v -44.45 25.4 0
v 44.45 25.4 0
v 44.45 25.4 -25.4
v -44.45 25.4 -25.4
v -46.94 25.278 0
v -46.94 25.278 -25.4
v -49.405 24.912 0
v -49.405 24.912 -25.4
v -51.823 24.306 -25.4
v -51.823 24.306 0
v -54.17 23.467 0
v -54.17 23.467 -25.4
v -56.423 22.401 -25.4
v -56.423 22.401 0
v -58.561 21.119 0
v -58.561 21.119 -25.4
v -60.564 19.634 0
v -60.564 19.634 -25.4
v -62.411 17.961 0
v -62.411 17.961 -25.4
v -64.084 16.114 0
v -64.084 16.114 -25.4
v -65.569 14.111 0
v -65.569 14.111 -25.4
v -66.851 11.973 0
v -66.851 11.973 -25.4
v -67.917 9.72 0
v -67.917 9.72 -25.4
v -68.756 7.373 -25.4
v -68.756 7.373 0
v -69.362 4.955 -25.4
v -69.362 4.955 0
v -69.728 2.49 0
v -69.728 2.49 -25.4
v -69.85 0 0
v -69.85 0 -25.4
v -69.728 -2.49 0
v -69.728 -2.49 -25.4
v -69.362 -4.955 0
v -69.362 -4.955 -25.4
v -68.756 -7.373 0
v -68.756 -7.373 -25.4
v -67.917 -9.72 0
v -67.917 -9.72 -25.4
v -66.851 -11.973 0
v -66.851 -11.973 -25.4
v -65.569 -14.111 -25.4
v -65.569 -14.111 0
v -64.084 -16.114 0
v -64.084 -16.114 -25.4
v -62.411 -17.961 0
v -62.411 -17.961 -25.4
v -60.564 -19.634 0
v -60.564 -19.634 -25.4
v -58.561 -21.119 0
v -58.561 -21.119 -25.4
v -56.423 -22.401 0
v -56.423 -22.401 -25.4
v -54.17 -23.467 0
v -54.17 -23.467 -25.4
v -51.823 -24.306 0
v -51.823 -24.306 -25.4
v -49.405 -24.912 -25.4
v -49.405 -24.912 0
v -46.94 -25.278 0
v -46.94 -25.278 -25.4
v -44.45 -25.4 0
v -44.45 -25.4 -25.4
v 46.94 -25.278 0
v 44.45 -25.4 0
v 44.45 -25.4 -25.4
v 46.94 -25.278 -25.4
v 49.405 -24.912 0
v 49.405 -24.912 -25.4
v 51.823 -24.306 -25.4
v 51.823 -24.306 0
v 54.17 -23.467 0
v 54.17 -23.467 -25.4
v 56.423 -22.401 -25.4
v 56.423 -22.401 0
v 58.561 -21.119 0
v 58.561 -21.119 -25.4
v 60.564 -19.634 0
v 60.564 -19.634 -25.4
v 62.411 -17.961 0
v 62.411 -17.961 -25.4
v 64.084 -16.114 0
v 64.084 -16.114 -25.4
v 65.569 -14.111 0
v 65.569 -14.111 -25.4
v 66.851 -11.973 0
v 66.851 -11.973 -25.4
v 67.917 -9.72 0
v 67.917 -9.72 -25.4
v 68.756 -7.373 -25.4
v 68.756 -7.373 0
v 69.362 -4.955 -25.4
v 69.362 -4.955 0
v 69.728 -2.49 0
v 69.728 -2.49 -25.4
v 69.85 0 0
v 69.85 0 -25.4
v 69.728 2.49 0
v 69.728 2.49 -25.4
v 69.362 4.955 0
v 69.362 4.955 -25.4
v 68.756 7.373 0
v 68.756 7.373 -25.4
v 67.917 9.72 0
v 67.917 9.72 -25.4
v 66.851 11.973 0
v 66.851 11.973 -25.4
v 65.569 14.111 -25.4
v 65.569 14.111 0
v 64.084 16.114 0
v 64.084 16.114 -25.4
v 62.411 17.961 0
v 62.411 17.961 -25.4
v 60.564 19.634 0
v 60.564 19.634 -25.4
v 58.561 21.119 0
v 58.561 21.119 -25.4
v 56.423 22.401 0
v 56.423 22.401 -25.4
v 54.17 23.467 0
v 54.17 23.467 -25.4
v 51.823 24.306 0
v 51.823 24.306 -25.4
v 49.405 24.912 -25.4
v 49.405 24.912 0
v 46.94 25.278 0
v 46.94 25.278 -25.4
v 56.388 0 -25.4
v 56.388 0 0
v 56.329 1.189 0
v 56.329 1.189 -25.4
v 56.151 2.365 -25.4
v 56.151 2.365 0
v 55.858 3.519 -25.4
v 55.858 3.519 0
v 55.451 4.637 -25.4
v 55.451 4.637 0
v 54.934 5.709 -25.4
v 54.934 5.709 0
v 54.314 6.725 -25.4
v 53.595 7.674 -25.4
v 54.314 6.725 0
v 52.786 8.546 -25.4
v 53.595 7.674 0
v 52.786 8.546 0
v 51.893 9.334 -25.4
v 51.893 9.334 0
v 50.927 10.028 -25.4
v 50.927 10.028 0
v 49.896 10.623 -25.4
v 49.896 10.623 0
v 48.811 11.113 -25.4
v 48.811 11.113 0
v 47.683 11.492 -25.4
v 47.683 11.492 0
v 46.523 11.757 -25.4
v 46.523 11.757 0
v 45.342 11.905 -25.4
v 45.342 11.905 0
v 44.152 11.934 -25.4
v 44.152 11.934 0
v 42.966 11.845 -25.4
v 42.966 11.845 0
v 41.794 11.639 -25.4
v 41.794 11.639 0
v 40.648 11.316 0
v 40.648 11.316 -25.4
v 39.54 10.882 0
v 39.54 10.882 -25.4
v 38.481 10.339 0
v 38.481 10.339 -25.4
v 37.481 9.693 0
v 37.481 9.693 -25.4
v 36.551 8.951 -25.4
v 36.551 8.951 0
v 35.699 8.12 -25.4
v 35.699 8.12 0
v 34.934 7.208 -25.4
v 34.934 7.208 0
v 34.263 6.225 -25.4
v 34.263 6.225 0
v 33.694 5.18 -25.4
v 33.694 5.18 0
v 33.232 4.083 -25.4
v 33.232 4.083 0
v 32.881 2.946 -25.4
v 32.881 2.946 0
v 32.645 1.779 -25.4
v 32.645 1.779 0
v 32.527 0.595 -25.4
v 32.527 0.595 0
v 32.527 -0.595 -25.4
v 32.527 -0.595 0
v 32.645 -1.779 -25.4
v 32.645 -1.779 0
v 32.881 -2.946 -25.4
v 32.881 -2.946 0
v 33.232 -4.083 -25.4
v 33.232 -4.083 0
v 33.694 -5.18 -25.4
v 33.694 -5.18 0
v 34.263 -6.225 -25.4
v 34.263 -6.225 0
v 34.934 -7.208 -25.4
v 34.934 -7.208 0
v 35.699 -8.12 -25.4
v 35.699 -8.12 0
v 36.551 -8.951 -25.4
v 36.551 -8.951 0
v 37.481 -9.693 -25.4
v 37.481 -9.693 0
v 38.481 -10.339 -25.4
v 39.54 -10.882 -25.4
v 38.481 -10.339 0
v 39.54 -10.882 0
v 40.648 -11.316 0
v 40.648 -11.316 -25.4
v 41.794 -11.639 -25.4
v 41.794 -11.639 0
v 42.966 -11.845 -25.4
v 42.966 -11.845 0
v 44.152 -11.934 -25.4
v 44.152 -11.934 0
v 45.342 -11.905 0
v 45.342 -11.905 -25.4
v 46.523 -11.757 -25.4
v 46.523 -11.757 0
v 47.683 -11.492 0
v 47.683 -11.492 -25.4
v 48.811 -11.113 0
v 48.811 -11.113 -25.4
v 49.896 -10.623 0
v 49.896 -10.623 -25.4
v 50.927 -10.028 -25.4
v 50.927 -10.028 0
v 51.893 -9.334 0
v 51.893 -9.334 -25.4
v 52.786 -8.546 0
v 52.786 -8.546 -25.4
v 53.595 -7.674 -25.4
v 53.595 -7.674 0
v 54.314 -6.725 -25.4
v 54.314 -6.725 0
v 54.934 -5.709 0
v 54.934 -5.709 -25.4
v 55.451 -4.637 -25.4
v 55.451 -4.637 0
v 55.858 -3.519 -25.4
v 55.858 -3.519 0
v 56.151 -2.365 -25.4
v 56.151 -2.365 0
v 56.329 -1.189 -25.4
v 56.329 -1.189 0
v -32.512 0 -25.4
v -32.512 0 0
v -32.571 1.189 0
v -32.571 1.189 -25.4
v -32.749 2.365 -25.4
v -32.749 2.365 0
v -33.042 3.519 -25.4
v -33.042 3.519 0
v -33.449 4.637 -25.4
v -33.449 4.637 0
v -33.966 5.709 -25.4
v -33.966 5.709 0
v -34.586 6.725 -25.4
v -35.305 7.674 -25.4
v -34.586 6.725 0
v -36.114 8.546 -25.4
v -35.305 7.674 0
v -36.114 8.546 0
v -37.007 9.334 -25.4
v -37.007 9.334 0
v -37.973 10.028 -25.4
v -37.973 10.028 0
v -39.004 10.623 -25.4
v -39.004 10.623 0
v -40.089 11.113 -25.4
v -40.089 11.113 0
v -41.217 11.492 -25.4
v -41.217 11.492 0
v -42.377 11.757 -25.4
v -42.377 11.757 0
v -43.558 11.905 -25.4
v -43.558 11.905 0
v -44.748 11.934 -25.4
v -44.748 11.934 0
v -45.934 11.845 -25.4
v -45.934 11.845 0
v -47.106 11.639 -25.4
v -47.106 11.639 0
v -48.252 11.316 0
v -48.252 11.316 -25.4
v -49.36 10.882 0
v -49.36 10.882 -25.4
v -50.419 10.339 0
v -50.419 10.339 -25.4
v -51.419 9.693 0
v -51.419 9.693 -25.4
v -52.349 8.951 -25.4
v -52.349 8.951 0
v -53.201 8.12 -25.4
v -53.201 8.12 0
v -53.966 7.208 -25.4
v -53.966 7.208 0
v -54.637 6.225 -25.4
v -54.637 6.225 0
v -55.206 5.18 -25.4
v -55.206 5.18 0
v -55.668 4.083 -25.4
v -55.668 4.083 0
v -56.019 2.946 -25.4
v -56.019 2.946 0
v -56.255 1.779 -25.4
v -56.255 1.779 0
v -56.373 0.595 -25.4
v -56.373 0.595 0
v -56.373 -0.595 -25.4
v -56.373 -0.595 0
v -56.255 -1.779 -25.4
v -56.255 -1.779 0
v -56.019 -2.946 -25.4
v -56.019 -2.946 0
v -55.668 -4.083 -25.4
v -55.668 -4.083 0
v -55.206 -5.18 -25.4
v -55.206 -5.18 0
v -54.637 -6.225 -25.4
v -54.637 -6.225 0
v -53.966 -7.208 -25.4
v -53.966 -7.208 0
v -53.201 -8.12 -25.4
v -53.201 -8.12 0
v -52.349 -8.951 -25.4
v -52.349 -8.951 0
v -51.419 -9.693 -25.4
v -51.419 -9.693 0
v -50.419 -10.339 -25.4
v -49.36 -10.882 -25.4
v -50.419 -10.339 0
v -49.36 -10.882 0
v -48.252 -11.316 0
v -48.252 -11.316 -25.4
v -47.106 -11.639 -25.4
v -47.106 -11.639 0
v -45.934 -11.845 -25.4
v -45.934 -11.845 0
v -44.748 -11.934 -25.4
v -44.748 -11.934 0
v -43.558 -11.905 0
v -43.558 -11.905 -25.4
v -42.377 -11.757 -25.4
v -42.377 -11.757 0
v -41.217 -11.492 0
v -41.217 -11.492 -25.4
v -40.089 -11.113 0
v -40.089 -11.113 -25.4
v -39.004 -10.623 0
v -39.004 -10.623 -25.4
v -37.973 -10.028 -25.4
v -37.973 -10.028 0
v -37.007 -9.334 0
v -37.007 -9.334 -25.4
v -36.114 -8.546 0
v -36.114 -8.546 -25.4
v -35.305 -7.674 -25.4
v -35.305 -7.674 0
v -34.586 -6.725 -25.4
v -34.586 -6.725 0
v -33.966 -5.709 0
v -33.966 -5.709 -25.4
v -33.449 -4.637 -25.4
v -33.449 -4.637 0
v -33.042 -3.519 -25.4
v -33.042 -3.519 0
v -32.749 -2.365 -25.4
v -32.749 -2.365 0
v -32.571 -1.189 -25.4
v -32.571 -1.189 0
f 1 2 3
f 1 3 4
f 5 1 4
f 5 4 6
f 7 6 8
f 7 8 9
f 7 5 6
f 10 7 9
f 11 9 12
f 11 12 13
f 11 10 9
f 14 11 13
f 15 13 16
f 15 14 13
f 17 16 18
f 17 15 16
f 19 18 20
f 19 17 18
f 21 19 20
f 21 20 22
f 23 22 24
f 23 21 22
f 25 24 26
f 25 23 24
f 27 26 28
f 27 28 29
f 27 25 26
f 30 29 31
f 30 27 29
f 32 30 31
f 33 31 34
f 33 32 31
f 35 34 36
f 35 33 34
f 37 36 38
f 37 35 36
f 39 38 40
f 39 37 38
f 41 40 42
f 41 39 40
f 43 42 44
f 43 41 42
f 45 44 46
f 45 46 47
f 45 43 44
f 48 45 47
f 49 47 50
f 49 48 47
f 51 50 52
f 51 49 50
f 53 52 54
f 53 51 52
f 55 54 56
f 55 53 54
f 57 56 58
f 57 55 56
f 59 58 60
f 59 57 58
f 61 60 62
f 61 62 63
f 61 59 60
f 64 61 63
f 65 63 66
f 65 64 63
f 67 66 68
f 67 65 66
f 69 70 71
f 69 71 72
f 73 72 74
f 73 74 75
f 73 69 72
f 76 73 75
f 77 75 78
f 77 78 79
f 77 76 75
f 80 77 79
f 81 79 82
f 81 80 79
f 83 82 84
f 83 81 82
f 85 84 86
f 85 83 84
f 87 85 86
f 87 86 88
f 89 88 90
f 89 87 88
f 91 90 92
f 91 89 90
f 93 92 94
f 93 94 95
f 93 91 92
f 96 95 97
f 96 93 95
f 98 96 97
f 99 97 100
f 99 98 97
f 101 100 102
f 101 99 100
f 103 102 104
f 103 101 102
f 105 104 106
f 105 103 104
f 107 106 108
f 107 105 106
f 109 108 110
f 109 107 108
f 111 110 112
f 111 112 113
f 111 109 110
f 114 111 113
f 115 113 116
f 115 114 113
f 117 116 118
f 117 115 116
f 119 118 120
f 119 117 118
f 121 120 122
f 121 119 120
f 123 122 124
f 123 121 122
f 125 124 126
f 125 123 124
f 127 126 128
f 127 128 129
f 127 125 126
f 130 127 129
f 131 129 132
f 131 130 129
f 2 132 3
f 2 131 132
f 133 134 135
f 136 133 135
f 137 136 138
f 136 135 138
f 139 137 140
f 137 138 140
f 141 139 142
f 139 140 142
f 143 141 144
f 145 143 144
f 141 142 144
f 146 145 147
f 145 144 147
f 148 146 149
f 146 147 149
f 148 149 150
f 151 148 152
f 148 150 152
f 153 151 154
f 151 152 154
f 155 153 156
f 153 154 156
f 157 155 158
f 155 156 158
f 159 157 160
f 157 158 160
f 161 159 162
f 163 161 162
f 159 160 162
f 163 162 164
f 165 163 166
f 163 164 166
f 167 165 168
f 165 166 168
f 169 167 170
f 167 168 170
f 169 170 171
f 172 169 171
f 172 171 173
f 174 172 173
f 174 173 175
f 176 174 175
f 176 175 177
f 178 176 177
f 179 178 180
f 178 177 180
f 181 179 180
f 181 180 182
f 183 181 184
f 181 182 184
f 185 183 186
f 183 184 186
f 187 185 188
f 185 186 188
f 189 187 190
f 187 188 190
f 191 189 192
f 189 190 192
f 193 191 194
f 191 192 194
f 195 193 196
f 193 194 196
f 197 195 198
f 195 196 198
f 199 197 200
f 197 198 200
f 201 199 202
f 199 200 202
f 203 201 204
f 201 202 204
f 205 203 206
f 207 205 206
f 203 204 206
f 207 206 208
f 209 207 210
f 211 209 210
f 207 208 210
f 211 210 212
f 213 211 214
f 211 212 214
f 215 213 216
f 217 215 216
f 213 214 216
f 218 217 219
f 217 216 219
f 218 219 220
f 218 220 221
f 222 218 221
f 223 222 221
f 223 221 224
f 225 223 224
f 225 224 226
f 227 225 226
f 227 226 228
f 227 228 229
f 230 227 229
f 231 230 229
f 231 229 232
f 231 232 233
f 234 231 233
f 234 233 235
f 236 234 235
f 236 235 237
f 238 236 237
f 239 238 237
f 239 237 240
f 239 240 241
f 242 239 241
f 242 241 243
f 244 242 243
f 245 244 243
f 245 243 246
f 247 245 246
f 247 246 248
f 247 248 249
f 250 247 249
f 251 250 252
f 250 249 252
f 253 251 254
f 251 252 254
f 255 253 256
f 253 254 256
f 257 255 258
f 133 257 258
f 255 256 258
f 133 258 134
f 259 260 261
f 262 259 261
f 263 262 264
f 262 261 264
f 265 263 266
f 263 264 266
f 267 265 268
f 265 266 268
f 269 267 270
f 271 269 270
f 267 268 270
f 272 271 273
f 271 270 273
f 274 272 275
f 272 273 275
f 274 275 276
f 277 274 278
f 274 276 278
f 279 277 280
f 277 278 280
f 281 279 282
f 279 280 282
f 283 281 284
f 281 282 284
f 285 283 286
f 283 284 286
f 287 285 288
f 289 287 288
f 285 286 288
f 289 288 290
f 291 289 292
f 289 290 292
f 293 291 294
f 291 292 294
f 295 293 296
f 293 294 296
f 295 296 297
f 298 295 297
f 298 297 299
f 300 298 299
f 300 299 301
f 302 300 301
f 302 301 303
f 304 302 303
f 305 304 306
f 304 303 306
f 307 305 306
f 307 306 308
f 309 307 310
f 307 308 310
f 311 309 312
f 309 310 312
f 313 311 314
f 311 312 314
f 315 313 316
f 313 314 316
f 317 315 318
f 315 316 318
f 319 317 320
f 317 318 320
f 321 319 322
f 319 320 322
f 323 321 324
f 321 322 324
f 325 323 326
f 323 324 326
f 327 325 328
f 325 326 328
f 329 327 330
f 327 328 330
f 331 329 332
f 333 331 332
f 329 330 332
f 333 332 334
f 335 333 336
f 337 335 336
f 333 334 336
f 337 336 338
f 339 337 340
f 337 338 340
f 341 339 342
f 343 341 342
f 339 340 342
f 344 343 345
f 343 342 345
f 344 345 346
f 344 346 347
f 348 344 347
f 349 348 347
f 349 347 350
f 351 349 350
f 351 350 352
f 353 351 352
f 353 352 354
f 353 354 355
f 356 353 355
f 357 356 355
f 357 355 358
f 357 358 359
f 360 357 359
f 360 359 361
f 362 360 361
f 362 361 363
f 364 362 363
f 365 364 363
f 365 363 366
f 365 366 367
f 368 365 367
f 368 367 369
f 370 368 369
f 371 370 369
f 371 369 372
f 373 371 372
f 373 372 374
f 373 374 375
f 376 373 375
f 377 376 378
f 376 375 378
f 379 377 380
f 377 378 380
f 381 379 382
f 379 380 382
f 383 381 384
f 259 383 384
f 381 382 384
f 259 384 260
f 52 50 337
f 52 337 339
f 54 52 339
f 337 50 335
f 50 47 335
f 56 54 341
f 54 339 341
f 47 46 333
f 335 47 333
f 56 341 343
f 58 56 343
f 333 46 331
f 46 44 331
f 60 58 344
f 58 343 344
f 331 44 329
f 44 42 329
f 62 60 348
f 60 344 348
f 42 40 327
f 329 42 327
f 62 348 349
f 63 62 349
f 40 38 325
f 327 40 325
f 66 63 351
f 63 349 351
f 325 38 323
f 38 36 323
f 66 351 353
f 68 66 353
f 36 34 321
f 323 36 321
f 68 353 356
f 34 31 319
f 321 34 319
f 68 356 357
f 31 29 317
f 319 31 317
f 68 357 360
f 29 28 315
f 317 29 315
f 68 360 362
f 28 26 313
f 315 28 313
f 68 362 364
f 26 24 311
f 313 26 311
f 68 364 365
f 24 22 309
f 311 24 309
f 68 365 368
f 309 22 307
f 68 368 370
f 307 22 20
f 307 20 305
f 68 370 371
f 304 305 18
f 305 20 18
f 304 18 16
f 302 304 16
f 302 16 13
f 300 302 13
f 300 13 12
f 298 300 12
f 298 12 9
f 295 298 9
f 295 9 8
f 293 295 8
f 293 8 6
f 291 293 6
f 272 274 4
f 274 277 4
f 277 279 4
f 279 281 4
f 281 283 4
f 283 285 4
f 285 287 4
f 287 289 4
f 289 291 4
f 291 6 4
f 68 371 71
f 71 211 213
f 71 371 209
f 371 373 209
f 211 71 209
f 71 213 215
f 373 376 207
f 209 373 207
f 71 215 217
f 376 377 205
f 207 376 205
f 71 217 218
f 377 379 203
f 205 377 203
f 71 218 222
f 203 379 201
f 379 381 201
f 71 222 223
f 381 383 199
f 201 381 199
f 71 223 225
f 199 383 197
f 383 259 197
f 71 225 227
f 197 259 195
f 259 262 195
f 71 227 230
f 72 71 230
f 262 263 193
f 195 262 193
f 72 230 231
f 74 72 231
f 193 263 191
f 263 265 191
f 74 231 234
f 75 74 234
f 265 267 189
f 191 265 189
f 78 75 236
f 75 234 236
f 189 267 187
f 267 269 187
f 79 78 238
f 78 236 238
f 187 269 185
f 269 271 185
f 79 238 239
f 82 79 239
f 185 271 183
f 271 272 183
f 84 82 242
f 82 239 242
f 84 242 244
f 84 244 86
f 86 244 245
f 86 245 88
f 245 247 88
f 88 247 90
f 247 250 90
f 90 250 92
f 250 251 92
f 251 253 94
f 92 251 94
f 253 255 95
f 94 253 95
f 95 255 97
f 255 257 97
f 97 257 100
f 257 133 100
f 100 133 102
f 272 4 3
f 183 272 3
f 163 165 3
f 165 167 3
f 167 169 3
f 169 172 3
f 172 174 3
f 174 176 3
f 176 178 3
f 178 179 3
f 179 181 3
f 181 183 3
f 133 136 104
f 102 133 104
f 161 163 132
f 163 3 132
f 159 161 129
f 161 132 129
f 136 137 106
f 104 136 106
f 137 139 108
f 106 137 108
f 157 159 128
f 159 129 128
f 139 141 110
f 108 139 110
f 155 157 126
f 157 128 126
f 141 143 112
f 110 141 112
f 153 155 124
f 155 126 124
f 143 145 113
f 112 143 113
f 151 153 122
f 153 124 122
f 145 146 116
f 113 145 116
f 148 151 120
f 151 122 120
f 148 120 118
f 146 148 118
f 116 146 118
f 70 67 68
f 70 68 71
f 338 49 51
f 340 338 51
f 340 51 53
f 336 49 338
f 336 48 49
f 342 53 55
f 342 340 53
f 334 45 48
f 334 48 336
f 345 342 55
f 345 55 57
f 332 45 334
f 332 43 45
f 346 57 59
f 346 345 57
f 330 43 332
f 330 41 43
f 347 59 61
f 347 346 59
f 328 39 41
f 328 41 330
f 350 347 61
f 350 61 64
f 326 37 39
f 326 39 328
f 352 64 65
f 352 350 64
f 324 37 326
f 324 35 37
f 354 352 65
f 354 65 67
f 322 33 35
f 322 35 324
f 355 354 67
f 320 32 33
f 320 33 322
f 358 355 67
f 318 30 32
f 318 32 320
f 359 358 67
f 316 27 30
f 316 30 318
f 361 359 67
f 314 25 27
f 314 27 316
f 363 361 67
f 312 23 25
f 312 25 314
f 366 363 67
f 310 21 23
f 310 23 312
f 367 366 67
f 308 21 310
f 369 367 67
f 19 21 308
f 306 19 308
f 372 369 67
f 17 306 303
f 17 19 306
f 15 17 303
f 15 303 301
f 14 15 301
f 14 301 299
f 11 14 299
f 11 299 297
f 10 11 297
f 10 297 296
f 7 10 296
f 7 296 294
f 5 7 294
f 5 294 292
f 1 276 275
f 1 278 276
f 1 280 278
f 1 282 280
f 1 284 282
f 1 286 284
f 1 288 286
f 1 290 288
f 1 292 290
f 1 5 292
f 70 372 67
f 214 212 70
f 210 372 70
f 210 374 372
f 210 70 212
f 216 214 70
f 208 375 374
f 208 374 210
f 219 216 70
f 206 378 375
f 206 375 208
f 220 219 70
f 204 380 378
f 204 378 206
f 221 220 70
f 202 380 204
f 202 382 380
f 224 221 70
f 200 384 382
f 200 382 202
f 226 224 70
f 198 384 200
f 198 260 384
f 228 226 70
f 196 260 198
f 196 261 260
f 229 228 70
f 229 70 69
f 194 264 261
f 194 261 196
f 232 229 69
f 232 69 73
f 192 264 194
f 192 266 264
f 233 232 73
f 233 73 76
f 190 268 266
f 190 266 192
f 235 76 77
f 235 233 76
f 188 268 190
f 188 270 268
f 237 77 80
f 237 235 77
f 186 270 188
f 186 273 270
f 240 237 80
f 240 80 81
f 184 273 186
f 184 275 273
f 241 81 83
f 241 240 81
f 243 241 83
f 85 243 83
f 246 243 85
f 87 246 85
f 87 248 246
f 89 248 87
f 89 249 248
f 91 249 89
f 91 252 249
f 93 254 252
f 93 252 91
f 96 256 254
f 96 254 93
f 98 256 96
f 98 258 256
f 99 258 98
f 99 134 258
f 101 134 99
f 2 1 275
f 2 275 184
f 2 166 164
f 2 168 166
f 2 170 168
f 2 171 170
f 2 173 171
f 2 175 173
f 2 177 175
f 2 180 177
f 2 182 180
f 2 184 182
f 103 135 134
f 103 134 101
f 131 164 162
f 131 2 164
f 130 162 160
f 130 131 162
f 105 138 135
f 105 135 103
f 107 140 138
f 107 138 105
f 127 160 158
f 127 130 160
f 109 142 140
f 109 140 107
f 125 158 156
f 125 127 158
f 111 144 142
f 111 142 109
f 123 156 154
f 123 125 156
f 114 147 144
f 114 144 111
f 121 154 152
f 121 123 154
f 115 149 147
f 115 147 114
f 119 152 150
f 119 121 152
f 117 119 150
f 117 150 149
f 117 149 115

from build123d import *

# Parameters (mm, degrees)
F0_R     = 11.938
F1_DEPTH = 25.4


with BuildPart() as f1:
    # F0 (on Top) → F1 (new body)
    with BuildSketch(Plane.XY):
        with BuildLine():
            Line((44.45, 25.4), (-44.45, 25.4))
            ThreePointArc((-44.45, 25.4), (-69.85, 0), (-44.45, -25.4))
            Line((-44.45, -25.4), (44.45, -25.4))
            ThreePointArc((44.45, -25.4), (69.85, 0), (44.45, 25.4))
        make_face()
        with Locations((-44.45, 0)):
            Circle(F0_R, mode=Mode.SUBTRACT)
        with Locations((44.45, 0)):
            Circle(F0_R, mode=Mode.SUBTRACT)
    extrude(amount=-F1_DEPTH)


solid = f1.part
